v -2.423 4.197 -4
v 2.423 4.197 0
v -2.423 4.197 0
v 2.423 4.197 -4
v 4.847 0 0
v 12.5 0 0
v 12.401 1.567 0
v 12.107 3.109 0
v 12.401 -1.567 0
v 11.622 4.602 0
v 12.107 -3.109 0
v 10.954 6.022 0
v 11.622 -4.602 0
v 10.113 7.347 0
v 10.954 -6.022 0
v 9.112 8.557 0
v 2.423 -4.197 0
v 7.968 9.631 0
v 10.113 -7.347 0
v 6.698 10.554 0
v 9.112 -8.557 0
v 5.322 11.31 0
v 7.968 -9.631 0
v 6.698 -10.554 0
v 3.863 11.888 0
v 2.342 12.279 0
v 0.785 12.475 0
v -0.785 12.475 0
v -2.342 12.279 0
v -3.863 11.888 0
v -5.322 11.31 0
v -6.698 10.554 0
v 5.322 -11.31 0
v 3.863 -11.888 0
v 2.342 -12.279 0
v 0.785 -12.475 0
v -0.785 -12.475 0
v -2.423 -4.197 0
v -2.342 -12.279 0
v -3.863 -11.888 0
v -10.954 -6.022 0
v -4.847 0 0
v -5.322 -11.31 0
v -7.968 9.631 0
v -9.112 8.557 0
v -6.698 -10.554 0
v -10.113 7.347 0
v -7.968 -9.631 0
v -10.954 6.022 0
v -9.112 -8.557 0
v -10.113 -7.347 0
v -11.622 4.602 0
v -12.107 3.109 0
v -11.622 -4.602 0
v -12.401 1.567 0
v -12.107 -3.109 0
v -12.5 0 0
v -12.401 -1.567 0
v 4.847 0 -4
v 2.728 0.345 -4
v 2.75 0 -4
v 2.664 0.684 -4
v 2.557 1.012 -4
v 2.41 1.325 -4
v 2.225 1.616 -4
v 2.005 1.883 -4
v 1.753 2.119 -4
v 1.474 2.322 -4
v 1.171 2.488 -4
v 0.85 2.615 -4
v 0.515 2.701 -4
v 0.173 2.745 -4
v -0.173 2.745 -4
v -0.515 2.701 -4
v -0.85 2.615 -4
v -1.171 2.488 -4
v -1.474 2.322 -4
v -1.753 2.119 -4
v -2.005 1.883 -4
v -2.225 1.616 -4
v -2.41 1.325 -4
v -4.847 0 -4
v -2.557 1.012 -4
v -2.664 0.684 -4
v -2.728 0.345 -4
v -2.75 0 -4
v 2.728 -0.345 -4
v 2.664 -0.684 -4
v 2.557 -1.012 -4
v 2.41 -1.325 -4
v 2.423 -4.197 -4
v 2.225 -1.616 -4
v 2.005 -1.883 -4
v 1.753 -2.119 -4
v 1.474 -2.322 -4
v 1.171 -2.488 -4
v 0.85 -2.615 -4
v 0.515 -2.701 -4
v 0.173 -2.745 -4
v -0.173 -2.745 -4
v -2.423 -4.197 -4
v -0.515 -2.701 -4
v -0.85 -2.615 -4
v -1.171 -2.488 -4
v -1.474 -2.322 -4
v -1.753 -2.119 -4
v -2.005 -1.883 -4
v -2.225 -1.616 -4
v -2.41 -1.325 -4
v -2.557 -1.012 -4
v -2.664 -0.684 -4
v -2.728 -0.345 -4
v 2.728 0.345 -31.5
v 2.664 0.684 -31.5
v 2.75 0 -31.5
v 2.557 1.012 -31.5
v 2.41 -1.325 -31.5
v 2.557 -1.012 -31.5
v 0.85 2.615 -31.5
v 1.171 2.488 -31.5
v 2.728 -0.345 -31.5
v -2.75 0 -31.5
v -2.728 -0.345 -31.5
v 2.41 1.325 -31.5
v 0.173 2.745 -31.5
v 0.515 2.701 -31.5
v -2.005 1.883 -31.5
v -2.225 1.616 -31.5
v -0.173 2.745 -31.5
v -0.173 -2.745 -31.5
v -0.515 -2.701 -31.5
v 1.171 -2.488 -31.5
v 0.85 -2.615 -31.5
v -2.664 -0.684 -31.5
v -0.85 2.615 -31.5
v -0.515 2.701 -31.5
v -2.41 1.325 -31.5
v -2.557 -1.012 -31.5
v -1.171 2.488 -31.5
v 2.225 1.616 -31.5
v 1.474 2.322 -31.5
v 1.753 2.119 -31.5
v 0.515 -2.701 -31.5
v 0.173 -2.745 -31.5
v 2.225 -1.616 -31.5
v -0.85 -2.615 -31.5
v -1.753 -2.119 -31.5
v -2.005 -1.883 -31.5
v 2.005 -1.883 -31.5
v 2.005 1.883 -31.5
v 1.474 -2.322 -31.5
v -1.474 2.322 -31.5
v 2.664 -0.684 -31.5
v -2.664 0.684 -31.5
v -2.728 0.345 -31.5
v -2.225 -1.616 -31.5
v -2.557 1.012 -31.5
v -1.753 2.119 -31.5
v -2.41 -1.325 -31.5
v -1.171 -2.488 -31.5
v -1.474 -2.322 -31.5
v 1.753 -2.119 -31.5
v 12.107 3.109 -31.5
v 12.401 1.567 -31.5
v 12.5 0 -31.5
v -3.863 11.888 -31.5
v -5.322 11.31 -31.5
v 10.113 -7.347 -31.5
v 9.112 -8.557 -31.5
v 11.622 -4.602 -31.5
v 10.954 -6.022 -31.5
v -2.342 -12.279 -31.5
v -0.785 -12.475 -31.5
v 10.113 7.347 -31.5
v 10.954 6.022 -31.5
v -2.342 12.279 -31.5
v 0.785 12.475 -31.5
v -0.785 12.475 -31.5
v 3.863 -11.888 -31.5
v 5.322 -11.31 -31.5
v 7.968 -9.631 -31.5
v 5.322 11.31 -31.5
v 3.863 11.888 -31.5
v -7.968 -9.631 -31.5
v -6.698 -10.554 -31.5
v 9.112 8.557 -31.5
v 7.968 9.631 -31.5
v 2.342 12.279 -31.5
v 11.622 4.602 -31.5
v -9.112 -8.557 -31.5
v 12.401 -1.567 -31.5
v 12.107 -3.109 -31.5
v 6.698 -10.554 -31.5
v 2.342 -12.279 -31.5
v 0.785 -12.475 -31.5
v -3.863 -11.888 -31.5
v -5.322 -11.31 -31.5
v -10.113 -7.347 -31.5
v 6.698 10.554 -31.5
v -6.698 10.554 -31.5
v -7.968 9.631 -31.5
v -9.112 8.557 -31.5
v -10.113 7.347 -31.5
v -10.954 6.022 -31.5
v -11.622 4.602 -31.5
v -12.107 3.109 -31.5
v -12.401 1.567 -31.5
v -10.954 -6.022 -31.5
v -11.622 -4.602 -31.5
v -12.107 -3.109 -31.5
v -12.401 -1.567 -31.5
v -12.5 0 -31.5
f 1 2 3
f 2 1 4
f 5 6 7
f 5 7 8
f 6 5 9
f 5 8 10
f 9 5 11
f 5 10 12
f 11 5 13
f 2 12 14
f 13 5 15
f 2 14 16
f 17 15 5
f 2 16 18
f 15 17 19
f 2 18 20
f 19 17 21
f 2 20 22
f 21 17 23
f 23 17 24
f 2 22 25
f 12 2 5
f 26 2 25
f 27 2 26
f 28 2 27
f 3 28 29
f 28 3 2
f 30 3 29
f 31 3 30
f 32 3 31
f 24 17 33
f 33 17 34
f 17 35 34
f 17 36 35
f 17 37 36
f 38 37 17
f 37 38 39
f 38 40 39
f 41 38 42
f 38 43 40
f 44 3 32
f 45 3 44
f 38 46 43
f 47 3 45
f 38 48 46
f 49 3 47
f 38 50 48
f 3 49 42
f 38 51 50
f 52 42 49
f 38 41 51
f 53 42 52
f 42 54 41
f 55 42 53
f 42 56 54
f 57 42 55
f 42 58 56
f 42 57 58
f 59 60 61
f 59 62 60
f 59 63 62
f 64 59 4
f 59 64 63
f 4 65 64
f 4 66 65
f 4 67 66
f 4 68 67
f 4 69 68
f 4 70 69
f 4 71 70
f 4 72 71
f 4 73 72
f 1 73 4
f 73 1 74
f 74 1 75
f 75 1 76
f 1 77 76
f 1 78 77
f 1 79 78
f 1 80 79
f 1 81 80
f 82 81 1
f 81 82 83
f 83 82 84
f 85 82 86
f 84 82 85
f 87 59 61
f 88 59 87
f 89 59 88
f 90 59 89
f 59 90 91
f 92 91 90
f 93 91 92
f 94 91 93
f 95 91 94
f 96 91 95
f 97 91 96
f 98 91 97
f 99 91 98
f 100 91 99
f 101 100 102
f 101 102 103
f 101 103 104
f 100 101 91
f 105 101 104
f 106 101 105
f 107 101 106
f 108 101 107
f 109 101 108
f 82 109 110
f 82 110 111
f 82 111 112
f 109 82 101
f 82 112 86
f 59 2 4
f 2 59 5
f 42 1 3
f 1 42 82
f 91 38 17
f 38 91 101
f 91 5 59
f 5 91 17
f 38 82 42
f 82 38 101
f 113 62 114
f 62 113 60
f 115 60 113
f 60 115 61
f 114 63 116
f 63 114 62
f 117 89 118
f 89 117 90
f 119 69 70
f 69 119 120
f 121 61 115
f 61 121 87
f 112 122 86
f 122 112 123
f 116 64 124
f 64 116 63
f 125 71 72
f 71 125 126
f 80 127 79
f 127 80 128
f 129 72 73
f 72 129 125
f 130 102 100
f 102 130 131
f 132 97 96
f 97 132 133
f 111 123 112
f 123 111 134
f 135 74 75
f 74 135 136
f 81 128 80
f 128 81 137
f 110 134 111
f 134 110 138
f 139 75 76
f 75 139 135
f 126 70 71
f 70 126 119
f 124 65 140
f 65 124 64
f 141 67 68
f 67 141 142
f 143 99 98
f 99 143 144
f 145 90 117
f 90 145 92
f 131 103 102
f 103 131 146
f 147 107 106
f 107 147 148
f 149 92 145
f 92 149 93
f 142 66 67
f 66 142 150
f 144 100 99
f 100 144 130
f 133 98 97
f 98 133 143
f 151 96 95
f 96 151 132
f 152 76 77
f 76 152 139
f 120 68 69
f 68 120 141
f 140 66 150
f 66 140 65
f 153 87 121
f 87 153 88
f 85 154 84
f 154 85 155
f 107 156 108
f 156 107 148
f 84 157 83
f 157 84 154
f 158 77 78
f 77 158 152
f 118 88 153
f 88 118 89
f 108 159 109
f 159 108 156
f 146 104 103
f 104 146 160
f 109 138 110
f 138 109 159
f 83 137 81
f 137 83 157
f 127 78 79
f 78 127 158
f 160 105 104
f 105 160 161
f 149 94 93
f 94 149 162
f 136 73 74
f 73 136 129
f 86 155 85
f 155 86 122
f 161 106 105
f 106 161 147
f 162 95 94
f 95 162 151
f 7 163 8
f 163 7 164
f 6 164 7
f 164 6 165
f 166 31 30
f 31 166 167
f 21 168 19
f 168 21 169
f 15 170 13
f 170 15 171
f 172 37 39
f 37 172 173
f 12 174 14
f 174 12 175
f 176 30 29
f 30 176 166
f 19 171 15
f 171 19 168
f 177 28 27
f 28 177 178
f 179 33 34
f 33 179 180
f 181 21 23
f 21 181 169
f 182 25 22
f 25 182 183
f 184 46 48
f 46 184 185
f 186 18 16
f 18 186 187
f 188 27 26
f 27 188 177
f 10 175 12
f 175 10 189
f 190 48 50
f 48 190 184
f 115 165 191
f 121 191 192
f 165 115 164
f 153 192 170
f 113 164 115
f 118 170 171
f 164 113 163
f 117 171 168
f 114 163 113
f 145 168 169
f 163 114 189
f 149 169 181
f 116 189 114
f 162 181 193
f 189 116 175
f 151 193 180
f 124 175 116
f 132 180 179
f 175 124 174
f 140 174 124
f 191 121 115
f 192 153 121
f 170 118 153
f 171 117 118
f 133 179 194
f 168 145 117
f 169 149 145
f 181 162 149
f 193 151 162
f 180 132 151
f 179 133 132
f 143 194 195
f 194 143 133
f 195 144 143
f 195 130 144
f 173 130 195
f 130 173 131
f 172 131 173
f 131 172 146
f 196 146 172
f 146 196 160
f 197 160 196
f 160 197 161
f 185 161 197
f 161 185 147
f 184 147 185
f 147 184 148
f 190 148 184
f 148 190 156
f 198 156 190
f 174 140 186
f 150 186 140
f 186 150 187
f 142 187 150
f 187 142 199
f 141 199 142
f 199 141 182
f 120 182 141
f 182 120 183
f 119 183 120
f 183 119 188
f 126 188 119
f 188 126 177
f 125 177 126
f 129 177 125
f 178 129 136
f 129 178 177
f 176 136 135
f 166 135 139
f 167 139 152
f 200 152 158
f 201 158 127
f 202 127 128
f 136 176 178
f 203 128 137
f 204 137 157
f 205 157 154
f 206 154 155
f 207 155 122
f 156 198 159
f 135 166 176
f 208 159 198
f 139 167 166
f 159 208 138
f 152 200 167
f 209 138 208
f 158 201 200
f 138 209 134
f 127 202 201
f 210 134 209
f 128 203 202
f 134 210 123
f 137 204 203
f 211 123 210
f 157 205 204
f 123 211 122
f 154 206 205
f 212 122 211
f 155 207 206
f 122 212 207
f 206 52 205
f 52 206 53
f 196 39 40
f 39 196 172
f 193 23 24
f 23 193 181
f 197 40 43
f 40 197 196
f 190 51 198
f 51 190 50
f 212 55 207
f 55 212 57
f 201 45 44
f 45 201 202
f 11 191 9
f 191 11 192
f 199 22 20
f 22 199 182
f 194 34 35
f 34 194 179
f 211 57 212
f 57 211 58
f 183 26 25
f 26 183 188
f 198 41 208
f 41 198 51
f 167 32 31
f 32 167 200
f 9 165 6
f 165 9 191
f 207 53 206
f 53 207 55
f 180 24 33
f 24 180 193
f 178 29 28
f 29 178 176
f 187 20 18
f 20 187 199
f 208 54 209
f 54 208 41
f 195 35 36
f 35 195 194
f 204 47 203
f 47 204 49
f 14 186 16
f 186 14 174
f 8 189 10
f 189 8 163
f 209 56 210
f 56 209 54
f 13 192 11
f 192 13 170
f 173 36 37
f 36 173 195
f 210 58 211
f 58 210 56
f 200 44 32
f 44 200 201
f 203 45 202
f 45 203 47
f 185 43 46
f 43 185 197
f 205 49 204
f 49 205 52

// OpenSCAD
$fn = 50;

difference() {
	union() {
		translate(v = [0, 0, -31.5]) {
			cylinder(h = 31.5, r = 12.5);
		}
	}
	union() {
		translate(v = [0, 0, 0]) {
			rotate(a = [0, 0, 0]) {
				difference() {
					union() {
						translate(v = [0, 0, -4]) {
							linear_extrude(height = 4) {
								polygon(points = [[4.8468, 0.0], [2.4234000000000004, 4.197451927062417], [-2.423399999999999, 4.197451927062417], [-4.8468, 5.935618106107392e-16], [-2.423400000000002, -4.197451927062416], [2.423399999999997, -4.197451927062419]]);
							}
						}
					}
					union();
				}
			}
		}
		#translate(v = [0, 0, -100.0]) {
			cylinder(h = 200, r = 2.75);
		}
	}
}
